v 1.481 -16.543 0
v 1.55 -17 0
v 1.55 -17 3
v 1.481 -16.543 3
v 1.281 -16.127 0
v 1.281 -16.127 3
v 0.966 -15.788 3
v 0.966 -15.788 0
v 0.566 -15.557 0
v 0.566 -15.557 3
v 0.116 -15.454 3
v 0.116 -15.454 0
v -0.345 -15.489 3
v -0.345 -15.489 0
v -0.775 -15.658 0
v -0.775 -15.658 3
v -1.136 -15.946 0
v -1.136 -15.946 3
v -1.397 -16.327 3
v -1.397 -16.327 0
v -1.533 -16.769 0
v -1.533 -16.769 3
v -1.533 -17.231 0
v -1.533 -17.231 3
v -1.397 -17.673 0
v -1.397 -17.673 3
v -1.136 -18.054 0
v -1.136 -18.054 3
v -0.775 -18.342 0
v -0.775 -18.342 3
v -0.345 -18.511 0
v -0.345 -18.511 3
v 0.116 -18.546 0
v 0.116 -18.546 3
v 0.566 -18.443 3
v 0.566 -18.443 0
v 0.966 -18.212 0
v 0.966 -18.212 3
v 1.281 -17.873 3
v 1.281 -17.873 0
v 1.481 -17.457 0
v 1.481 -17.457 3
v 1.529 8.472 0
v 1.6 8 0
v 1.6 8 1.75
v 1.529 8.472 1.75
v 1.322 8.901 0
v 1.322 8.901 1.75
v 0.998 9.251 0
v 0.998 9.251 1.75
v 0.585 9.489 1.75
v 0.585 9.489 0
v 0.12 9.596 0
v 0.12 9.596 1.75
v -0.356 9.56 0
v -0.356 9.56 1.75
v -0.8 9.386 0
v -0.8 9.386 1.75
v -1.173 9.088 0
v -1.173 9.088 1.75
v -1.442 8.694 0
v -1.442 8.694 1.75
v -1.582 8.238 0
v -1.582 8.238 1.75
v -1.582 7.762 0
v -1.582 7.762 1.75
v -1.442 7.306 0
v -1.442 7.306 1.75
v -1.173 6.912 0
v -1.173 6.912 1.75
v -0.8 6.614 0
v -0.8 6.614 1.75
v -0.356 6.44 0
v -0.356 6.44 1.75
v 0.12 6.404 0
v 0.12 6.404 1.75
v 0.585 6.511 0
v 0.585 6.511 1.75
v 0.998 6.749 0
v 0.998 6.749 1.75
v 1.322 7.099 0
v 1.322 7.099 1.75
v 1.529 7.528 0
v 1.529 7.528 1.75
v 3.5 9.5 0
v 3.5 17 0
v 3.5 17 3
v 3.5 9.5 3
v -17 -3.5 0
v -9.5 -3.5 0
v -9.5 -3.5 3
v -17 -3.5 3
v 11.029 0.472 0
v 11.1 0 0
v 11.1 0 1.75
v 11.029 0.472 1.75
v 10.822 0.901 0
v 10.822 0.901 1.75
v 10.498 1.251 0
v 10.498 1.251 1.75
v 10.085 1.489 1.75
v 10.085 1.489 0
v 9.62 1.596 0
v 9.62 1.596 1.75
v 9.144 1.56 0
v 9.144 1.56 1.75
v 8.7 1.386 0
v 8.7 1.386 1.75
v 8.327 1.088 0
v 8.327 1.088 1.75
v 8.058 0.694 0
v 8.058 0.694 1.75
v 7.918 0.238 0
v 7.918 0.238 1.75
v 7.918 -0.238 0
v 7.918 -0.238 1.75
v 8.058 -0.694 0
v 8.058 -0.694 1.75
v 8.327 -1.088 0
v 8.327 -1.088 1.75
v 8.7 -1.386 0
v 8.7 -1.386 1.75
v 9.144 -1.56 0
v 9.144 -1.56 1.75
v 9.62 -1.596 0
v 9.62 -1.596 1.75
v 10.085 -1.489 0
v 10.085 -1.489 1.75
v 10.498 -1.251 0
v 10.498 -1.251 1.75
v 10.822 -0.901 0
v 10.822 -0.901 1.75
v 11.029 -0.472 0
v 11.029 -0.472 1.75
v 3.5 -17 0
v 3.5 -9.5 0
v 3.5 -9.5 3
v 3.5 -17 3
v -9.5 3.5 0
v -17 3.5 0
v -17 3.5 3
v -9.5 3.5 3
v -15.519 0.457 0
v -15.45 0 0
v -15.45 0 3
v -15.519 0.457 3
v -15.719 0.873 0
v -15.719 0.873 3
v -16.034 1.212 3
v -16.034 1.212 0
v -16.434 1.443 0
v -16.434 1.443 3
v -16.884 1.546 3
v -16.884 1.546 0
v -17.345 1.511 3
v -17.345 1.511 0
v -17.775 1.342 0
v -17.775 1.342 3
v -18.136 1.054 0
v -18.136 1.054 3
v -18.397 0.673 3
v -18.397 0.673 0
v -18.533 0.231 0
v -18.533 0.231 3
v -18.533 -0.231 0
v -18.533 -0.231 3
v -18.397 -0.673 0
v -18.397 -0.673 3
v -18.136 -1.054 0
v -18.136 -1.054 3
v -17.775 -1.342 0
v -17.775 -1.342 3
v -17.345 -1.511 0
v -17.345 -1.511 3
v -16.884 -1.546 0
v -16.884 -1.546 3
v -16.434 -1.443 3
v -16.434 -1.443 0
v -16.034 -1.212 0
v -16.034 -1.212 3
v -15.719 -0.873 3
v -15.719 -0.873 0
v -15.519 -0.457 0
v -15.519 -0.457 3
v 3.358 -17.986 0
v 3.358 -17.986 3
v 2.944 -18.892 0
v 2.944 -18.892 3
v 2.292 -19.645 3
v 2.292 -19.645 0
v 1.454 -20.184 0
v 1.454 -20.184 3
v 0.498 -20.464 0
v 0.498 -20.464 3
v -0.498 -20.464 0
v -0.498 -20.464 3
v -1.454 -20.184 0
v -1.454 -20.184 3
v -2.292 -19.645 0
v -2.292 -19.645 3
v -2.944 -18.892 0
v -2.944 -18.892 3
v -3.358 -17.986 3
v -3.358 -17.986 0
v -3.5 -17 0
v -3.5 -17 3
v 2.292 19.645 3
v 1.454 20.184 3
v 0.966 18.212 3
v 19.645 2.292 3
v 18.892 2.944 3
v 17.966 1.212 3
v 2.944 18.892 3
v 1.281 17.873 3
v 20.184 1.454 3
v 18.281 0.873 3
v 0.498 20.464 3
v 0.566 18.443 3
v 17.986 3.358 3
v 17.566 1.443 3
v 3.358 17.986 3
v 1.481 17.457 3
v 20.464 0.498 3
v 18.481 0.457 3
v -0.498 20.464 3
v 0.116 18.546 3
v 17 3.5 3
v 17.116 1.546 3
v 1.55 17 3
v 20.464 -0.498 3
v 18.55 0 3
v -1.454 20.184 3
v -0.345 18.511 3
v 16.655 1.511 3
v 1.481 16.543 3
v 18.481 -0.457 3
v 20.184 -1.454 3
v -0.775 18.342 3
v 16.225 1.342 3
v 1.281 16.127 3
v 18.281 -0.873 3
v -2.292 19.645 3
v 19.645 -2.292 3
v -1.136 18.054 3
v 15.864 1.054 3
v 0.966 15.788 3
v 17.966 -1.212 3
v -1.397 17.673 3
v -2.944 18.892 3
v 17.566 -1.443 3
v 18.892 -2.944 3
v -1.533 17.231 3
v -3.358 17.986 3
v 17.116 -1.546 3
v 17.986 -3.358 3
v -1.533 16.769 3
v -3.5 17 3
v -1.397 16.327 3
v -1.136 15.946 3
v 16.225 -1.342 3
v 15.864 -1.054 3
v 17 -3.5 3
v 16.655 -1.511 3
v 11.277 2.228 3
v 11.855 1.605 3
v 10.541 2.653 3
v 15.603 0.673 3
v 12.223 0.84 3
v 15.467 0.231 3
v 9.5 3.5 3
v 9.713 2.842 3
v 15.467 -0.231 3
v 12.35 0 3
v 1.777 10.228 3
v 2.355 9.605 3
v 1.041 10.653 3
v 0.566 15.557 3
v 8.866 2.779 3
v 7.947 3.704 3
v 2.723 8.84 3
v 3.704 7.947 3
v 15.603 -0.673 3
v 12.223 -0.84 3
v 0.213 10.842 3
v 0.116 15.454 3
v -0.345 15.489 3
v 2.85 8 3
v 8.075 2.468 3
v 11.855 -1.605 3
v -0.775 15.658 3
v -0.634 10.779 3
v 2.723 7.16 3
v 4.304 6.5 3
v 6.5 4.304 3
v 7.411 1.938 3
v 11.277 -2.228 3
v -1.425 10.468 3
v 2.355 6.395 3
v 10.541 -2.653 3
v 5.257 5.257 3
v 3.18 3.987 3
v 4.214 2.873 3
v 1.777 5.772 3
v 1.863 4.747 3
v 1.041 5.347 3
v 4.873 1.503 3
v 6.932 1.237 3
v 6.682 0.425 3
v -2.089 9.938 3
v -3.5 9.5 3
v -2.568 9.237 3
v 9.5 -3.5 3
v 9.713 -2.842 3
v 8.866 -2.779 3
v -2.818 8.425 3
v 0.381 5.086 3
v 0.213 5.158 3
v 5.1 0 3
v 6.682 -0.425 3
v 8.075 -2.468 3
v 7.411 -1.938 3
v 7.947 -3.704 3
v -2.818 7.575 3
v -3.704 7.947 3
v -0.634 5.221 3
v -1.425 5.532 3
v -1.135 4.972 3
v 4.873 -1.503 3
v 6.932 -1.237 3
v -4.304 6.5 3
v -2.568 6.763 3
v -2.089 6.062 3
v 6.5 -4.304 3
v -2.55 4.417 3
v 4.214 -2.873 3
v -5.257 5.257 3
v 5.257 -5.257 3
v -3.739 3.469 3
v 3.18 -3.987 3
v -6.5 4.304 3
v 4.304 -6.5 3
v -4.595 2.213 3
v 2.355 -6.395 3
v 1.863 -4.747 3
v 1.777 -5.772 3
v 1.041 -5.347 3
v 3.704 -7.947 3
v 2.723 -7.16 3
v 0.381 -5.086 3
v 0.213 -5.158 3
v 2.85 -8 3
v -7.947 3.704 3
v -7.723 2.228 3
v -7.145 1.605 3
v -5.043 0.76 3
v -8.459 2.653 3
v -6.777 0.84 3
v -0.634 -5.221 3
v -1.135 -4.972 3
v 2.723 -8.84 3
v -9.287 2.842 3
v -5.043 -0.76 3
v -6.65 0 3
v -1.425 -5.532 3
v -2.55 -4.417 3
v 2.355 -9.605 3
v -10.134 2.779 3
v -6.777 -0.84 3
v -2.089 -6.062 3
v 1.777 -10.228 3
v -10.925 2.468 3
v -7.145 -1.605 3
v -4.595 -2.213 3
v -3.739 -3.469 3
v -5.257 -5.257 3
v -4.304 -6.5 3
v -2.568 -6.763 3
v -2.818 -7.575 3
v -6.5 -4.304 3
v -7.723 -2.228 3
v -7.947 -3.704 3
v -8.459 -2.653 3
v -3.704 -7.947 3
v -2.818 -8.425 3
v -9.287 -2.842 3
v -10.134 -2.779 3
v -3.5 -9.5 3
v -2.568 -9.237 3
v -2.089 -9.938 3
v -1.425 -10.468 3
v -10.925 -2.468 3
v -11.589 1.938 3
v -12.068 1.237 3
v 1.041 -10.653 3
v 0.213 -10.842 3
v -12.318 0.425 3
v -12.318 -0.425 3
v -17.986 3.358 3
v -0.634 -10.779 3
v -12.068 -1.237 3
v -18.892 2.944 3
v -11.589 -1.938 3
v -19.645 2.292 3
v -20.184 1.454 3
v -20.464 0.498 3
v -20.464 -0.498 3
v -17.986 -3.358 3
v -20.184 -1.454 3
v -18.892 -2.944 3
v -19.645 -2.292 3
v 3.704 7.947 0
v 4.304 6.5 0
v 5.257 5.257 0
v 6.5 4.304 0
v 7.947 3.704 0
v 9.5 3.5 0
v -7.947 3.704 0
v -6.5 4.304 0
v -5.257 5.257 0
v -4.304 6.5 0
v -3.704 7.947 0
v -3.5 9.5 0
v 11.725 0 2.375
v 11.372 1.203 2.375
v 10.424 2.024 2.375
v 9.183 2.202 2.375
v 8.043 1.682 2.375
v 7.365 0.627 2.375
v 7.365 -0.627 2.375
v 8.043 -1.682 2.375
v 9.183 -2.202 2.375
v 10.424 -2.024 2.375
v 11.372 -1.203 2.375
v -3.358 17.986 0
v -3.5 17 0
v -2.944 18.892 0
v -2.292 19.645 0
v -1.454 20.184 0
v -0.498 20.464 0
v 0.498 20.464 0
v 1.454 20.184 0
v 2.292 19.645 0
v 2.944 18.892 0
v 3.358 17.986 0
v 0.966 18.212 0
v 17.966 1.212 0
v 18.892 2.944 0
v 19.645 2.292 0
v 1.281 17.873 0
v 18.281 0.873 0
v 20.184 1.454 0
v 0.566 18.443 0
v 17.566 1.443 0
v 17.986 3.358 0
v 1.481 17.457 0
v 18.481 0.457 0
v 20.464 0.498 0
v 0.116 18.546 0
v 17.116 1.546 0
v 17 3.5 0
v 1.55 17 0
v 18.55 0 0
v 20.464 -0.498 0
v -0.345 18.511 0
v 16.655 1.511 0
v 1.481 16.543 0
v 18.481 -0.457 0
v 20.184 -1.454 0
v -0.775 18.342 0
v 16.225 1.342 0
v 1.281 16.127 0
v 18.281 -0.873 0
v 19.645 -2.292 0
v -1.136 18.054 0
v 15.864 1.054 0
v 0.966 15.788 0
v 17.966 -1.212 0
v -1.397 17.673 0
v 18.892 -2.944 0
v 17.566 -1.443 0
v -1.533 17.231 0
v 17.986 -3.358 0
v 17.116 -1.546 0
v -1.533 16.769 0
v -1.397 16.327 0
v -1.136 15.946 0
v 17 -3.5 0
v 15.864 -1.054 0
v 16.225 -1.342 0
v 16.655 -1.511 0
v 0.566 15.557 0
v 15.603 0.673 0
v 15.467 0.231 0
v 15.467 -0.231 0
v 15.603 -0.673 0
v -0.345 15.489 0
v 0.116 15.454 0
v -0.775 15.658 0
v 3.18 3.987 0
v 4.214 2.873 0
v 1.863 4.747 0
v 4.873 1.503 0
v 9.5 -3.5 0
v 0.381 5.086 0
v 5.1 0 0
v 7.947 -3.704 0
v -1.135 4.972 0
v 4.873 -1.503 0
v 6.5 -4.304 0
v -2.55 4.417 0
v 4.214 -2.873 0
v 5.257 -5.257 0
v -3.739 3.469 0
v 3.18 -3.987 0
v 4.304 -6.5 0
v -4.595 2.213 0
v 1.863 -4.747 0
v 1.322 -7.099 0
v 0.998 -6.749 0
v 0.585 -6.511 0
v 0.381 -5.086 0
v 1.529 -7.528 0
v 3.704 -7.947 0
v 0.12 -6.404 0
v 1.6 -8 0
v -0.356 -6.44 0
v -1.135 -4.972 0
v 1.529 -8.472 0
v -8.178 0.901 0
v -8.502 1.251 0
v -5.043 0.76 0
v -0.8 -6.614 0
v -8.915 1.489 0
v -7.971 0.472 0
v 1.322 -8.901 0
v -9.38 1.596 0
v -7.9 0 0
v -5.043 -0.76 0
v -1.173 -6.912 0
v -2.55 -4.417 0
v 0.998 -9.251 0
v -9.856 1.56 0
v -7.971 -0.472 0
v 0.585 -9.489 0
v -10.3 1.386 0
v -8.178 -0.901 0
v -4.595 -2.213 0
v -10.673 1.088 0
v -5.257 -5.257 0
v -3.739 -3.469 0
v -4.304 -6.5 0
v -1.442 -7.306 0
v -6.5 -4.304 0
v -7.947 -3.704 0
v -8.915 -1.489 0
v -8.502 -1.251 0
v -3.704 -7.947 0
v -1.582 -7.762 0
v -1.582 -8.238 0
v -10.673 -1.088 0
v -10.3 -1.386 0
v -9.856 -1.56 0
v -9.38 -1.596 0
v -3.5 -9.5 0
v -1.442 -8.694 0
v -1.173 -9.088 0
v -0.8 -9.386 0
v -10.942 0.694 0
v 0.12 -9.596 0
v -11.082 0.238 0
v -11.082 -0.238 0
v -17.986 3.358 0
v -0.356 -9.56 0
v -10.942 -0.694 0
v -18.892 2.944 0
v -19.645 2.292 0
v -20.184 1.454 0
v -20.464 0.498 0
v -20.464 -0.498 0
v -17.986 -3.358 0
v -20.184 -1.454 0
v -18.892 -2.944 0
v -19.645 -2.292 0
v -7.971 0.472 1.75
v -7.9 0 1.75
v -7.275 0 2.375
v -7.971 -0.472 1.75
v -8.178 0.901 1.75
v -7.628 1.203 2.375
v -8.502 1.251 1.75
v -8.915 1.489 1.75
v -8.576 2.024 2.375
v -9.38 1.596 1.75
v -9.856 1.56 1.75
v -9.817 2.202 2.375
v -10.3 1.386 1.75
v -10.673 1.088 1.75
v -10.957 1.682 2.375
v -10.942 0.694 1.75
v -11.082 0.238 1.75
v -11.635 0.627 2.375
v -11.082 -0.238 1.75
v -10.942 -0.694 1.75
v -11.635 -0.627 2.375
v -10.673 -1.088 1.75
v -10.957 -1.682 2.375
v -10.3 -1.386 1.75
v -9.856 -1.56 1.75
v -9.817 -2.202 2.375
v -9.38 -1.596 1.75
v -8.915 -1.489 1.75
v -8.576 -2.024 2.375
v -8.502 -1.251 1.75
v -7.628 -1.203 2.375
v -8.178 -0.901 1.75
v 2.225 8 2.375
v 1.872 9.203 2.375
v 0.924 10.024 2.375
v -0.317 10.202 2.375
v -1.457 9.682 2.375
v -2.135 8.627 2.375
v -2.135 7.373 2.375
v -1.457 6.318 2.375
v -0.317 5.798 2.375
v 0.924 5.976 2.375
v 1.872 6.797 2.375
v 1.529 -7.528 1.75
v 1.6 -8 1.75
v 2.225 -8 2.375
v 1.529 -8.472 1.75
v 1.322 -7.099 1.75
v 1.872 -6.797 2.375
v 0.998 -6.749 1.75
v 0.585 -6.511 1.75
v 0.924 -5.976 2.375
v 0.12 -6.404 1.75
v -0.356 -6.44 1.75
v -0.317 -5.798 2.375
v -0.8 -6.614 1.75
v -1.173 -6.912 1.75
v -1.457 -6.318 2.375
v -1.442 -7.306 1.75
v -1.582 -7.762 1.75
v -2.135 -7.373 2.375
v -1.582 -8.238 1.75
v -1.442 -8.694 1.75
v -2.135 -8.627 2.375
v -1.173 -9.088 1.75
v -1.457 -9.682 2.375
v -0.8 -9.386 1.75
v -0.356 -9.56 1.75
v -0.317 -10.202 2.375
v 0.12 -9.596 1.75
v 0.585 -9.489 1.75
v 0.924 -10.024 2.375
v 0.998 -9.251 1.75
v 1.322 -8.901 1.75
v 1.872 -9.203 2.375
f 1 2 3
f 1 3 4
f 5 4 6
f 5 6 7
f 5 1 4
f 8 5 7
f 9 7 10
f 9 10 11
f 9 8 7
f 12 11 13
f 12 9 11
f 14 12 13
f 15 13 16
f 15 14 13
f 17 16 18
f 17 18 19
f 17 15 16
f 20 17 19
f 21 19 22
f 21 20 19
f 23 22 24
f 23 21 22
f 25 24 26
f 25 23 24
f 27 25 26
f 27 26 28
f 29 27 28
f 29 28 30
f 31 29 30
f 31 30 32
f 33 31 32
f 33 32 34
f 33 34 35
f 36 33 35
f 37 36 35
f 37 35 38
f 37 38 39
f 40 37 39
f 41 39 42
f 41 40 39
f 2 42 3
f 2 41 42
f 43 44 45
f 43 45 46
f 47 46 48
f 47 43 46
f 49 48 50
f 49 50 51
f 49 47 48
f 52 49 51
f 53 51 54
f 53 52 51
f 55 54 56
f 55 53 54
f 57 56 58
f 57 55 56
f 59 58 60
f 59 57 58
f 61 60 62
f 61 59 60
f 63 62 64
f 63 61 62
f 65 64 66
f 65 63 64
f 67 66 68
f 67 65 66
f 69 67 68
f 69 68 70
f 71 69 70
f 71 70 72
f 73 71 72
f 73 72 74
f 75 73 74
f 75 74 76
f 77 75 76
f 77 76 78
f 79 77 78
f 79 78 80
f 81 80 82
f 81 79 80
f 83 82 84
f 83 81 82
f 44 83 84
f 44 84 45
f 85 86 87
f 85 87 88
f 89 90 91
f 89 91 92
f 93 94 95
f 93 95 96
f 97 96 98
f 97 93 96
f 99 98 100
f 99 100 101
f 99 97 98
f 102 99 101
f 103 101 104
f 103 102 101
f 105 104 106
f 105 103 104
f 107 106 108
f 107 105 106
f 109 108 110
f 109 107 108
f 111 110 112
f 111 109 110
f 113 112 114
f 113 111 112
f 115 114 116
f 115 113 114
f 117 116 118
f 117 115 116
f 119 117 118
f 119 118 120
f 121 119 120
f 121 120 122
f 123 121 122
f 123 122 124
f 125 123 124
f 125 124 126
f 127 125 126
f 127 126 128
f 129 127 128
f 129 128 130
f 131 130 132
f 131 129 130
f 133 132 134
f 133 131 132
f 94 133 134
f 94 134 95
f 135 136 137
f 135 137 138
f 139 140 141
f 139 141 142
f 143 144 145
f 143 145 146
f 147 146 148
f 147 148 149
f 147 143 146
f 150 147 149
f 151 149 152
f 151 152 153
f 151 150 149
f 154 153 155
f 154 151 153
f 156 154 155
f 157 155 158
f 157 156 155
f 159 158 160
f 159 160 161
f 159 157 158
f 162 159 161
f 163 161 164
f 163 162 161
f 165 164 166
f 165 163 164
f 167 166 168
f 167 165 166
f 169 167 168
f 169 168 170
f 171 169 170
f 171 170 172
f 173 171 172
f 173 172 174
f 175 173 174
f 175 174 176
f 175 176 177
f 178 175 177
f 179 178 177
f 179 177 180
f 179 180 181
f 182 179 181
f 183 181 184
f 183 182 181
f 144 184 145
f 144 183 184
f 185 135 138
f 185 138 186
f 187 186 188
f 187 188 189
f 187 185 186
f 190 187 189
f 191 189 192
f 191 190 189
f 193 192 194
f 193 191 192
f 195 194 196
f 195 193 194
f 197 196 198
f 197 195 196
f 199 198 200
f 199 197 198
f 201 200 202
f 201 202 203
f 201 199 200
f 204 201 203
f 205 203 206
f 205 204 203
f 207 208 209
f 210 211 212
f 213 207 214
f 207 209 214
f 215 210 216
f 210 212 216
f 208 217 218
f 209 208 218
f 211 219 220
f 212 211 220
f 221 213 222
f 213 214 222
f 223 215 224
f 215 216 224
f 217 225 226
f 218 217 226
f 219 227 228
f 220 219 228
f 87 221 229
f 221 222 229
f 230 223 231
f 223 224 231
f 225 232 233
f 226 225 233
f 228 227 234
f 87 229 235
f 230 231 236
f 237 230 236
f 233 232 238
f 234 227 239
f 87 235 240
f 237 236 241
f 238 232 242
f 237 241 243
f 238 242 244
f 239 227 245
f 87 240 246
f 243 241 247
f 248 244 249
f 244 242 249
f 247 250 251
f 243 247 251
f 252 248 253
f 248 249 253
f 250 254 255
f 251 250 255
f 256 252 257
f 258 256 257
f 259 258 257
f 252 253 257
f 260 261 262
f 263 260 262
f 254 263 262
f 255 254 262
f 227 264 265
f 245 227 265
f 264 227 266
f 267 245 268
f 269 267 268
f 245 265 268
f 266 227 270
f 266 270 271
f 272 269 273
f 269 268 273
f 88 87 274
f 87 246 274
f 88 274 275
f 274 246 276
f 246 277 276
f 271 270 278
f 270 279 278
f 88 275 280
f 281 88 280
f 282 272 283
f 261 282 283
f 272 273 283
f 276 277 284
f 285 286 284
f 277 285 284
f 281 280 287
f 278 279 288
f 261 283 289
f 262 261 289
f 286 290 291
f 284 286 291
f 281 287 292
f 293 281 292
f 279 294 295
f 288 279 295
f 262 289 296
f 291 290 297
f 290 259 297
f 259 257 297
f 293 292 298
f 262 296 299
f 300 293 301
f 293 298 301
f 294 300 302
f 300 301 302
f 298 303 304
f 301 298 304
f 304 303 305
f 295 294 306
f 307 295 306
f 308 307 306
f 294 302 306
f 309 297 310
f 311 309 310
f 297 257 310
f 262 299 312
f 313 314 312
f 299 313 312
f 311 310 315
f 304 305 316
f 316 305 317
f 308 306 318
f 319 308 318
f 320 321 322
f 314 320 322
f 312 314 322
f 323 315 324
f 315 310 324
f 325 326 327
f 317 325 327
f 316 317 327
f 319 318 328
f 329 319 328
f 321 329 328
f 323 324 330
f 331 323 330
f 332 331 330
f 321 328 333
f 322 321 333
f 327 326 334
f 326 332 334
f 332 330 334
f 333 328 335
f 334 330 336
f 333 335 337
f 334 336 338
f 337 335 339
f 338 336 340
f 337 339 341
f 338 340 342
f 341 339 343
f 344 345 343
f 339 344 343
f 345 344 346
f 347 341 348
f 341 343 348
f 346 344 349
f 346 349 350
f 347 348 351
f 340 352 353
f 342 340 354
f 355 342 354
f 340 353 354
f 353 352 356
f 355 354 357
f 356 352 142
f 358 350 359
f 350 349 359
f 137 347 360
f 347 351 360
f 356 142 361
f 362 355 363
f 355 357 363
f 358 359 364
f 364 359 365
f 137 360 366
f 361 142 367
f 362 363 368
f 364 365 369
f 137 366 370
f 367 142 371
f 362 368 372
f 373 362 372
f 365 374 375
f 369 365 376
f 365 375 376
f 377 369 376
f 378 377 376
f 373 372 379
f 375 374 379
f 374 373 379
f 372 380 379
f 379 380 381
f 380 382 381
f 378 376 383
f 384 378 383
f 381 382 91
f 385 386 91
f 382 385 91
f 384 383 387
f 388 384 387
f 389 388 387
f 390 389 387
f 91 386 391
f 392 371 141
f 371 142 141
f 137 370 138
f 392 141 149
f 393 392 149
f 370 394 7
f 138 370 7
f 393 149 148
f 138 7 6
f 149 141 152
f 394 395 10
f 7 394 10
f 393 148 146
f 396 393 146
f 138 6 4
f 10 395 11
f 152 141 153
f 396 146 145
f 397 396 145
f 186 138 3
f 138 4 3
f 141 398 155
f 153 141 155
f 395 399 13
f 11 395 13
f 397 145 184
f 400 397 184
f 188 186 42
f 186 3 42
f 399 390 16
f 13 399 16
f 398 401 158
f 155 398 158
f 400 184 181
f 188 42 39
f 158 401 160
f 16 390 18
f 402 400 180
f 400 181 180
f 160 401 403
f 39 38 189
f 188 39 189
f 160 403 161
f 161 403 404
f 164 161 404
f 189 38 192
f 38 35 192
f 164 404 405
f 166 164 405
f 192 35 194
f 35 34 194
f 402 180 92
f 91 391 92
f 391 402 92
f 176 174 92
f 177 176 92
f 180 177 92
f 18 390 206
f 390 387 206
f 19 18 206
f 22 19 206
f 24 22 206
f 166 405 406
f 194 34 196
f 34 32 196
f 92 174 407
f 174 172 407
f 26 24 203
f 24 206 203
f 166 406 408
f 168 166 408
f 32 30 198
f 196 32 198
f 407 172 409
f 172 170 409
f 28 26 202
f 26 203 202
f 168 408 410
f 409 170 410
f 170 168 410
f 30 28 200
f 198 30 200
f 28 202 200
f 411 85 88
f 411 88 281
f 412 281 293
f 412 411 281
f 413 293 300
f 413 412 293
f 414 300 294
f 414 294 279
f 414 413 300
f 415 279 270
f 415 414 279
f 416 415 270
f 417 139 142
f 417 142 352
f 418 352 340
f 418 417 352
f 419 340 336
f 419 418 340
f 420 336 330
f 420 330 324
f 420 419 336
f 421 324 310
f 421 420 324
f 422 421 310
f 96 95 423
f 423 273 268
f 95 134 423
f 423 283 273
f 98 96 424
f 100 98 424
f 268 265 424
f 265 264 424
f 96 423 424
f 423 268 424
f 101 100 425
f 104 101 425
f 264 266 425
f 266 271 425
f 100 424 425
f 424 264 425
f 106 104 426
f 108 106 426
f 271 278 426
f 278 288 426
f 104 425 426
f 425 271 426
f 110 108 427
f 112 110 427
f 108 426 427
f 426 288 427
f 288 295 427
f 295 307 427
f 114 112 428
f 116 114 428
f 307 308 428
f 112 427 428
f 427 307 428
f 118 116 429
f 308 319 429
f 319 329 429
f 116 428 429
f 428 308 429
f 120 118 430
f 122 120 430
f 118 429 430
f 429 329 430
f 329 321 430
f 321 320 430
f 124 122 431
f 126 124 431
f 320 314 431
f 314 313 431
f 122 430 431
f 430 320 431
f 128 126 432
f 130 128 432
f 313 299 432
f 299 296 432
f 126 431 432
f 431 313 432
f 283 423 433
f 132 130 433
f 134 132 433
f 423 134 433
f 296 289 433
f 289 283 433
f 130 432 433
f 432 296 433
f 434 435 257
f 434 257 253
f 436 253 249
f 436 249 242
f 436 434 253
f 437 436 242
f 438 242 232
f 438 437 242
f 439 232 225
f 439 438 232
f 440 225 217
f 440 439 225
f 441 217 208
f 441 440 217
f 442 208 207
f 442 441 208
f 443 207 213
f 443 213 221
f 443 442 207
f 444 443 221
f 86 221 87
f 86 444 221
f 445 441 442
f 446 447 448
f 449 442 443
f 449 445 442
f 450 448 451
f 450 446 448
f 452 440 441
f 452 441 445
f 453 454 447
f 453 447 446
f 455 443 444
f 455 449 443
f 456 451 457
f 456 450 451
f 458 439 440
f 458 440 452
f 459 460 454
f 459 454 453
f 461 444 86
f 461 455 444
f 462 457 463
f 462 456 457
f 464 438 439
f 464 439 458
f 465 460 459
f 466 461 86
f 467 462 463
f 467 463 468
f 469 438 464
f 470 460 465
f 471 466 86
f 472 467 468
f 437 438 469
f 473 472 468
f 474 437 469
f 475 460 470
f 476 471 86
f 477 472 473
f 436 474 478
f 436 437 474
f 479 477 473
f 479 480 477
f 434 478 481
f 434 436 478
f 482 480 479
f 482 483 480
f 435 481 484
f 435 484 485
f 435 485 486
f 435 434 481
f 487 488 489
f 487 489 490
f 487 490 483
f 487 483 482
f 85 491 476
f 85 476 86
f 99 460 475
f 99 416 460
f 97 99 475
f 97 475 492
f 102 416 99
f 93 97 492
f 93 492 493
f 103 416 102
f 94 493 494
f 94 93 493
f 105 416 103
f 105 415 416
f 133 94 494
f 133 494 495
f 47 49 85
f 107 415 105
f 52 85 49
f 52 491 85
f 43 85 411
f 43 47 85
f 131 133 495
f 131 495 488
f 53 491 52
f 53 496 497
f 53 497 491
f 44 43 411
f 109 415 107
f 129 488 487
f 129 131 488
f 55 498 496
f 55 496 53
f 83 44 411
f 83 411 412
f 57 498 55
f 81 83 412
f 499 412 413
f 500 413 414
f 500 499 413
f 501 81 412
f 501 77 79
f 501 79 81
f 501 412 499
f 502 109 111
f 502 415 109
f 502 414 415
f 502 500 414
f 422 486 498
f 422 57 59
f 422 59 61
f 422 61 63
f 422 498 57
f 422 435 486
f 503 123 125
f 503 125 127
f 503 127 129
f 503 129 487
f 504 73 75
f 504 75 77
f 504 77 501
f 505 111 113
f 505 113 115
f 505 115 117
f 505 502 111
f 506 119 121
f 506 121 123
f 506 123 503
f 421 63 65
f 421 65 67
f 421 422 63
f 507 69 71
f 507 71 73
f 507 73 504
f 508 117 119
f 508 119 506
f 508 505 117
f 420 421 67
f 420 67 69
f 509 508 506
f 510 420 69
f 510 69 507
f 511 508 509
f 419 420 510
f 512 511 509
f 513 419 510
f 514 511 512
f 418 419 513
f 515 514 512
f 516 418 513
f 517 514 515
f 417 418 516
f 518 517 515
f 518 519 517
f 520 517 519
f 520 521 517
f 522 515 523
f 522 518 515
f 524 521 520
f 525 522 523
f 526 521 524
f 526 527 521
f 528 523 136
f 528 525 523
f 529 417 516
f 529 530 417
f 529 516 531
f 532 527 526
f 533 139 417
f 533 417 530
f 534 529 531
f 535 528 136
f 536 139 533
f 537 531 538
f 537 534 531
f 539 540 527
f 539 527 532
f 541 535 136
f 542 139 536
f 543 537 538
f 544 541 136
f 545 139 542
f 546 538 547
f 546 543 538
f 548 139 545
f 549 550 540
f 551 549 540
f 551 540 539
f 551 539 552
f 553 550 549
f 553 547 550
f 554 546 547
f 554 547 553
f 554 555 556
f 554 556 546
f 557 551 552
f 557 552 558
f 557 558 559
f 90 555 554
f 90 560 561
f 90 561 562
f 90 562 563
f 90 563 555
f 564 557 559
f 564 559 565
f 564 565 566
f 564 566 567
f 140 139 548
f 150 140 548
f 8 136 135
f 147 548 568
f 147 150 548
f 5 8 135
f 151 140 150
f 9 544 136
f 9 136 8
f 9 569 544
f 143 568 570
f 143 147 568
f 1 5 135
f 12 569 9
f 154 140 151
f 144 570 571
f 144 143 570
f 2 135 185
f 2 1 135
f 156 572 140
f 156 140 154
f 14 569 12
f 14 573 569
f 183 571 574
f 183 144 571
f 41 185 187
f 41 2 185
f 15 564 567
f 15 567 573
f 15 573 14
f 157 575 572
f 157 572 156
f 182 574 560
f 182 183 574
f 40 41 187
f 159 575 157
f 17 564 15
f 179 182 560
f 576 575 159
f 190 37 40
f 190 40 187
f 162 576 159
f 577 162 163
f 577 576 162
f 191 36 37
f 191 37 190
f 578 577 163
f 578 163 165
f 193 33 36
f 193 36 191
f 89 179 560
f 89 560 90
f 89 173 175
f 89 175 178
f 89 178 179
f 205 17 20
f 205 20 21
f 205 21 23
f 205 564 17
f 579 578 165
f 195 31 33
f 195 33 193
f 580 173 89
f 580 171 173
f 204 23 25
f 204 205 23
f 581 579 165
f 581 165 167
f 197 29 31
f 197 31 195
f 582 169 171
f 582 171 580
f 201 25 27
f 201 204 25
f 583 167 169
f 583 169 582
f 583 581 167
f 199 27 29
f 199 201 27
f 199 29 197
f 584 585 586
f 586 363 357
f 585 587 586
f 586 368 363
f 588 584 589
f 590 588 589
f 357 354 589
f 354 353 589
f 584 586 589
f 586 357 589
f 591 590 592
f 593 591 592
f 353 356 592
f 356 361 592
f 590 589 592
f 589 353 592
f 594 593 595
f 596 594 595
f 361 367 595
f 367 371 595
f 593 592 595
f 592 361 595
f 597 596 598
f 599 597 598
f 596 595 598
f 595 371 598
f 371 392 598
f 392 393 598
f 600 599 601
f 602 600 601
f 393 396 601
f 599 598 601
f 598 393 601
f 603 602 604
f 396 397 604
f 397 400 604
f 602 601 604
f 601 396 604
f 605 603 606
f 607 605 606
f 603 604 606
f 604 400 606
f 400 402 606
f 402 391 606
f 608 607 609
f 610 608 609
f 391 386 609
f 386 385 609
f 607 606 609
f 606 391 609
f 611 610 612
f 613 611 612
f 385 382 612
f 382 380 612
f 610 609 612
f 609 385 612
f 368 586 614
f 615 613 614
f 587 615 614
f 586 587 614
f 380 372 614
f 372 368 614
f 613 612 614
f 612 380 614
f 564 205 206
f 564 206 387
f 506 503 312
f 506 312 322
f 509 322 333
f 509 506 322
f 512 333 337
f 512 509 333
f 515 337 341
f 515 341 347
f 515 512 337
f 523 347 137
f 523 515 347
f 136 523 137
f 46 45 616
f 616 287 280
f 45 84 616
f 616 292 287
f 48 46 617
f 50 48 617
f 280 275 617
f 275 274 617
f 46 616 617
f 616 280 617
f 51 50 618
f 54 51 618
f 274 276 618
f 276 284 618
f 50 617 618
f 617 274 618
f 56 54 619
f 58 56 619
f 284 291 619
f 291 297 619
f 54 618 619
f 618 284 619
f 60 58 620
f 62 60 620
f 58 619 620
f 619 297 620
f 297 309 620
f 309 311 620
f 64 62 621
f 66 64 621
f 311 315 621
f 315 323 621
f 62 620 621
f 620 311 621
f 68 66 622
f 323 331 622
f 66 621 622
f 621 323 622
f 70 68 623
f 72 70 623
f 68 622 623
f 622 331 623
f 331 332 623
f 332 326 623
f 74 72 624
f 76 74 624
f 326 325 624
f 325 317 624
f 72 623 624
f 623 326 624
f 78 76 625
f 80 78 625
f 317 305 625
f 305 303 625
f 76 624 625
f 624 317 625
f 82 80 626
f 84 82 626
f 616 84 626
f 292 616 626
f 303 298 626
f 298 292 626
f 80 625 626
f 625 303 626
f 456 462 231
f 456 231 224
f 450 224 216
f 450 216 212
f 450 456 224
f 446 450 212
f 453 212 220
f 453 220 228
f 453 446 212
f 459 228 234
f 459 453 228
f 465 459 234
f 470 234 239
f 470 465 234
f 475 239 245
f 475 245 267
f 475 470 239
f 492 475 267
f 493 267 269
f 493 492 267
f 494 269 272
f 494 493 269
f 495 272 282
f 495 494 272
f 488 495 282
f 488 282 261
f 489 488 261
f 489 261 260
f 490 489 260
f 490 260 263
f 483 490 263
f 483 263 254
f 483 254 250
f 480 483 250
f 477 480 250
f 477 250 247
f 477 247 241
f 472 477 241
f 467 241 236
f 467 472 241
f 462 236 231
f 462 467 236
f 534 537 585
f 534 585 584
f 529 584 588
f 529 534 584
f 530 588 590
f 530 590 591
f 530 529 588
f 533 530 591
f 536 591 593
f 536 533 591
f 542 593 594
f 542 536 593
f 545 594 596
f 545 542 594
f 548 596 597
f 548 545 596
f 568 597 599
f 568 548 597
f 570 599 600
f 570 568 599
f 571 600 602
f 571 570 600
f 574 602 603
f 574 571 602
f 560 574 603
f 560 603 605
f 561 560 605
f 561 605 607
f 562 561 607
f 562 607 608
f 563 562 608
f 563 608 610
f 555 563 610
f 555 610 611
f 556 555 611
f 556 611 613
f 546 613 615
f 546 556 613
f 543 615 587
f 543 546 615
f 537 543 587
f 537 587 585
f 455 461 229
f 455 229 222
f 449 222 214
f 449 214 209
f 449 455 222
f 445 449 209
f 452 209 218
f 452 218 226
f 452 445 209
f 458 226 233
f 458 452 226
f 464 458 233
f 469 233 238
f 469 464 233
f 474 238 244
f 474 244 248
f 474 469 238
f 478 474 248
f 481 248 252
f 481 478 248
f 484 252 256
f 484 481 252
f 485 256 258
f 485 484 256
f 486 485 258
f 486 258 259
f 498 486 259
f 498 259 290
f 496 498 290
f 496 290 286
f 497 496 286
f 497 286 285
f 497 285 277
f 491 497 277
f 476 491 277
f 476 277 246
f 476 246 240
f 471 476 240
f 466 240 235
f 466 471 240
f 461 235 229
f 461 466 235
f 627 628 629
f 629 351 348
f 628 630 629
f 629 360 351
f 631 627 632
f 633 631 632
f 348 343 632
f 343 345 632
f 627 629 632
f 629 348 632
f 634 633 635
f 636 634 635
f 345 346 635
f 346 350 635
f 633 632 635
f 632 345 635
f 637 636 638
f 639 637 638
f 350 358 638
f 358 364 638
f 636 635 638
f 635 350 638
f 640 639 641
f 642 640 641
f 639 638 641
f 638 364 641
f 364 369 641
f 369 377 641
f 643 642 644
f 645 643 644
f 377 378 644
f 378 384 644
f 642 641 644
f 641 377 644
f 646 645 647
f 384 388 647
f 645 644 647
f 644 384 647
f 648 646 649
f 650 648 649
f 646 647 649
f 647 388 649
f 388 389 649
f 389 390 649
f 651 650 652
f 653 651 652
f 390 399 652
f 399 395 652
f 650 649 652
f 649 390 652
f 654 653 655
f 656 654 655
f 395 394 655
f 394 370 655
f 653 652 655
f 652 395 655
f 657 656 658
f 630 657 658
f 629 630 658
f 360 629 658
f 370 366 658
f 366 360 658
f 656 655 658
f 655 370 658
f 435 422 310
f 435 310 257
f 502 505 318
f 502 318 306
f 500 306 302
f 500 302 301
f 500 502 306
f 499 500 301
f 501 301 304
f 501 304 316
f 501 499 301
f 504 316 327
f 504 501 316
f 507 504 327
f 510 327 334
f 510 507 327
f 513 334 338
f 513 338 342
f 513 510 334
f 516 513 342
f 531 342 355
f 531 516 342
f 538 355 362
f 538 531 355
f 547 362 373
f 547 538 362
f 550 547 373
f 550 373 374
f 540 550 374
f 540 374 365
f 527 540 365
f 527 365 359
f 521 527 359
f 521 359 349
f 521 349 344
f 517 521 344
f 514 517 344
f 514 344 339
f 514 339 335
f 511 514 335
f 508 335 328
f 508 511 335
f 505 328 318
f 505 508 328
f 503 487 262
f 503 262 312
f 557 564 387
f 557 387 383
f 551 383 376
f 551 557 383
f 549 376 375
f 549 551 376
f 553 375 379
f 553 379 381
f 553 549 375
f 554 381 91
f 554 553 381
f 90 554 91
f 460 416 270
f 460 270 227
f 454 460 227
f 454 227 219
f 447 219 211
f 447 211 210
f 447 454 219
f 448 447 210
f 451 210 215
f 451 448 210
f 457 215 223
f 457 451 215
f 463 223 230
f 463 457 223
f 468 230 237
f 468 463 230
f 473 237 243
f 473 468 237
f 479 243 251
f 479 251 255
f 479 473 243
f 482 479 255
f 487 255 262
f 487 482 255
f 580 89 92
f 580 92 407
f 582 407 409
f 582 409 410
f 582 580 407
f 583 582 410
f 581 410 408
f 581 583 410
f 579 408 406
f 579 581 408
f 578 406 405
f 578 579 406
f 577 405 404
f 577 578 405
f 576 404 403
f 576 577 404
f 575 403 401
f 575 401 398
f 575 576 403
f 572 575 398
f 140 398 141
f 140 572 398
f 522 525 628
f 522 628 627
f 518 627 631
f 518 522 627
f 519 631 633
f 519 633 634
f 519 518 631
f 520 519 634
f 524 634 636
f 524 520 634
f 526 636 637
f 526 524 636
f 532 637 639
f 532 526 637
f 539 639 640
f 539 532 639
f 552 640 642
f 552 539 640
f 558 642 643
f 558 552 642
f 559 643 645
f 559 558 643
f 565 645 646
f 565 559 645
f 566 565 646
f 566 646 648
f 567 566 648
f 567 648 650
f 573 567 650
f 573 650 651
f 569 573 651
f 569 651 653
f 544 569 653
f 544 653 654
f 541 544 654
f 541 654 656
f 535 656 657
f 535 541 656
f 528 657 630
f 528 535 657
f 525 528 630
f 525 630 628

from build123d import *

# Parameters (mm, degrees)
SKETCH1_R           = 5.1
SKETCH1_R_2         = 1.6
SKETCH1_R_3         = 1.55
BOSS_EXTRUDE1_DEPTH = 3
CHAMFER1_SIZE       = 1.25


with BuildPart() as part:
    # Sketch1 → Boss-Extrude1 (new body)
    with BuildSketch(Plane(origin=(0, 0, 0), x_dir=(0, 1, 0), z_dir=(0, 0, 1))):
        with BuildLine():
            Line((3.5, 17), (3.5, 9.5))
            ThreePointArc((3.5, 9.5), (5.257359313, 5.257359313), (9.5, 3.5))
            Line((9.5, 3.5), (17, 3.5))
            ThreePointArc((17, 3.5), (20.5, 0), (17, -3.5))
            Line((17, -3.5), (9.5, -3.5))
            ThreePointArc((9.5, -3.5), (5.257359313, -5.257359313), (3.5, -9.5))
            Line((3.5, -9.5), (3.5, -17))
            ThreePointArc((3.5, -17), (0, -20.5), (-3.5, -17))
            Line((-3.5, -17), (-3.5, -9.5))
            ThreePointArc((-3.5, -9.5), (-5.257359313, -5.257359313), (-9.5, -3.5))
            Line((-9.5, -3.5), (-17, -3.5))
            ThreePointArc((-17, -3.5), (-20.5, 0), (-17, 3.5))
            Line((-17, 3.5), (-9.5, 3.5))
            ThreePointArc((-9.5, 3.5), (-5.257359313, 5.257359313), (-3.5, 9.5))
            Line((-3.5, 9.5), (-3.5, 17))
            ThreePointArc((-3.5, 17), (0, 20.5), (3.5, 17))
        make_face()
        with Locations(Location((0, 0, 0), (0, 0, 270))):
            Circle(SKETCH1_R, mode=Mode.SUBTRACT)
        with Locations(Location((0, 9.5, 0), (0, 0, 270))):
            Circle(SKETCH1_R_2, mode=Mode.SUBTRACT)
        with Locations(Location((8, 0, 0), (0, 0, 270))):
            Circle(SKETCH1_R_2, mode=Mode.SUBTRACT)
        with Locations(Location((-8, 0, 0), (0, 0, 270))):
            Circle(SKETCH1_R_2, mode=Mode.SUBTRACT)
        with Locations(Location((0, -9.5, 0), (0, 0, 270))):
            Circle(SKETCH1_R_2, mode=Mode.SUBTRACT)
        with Locations(Location((0, 17, 0), (0, 0, 270))):
            Circle(SKETCH1_R_3, mode=Mode.SUBTRACT)
        with Locations(Location((17, 0, 0), (0, 0, 270))):
            Circle(SKETCH1_R_3, mode=Mode.SUBTRACT)
        with Locations(Location((-17, 0, 0), (0, 0, 270))):
            Circle(SKETCH1_R_3, mode=Mode.SUBTRACT)
        with Locations(Location((0, -17, 0), (0, 0, 270))):
            Circle(SKETCH1_R_3, mode=Mode.SUBTRACT)
    extrude(amount=BOSS_EXTRUDE1_DEPTH)

    # Chamfer1
    chamfer1_edges = [part.edges().sort_by_distance(p)[0] for p in [
        (-11.1, 0, 3),
        (-1.6, 8, 3),
        (-1.6, -8, 3),
        (7.9, 0, 3),
    ]]
    chamfer(chamfer1_edges, length=CHAMFER1_SIZE)


solid = part.part
